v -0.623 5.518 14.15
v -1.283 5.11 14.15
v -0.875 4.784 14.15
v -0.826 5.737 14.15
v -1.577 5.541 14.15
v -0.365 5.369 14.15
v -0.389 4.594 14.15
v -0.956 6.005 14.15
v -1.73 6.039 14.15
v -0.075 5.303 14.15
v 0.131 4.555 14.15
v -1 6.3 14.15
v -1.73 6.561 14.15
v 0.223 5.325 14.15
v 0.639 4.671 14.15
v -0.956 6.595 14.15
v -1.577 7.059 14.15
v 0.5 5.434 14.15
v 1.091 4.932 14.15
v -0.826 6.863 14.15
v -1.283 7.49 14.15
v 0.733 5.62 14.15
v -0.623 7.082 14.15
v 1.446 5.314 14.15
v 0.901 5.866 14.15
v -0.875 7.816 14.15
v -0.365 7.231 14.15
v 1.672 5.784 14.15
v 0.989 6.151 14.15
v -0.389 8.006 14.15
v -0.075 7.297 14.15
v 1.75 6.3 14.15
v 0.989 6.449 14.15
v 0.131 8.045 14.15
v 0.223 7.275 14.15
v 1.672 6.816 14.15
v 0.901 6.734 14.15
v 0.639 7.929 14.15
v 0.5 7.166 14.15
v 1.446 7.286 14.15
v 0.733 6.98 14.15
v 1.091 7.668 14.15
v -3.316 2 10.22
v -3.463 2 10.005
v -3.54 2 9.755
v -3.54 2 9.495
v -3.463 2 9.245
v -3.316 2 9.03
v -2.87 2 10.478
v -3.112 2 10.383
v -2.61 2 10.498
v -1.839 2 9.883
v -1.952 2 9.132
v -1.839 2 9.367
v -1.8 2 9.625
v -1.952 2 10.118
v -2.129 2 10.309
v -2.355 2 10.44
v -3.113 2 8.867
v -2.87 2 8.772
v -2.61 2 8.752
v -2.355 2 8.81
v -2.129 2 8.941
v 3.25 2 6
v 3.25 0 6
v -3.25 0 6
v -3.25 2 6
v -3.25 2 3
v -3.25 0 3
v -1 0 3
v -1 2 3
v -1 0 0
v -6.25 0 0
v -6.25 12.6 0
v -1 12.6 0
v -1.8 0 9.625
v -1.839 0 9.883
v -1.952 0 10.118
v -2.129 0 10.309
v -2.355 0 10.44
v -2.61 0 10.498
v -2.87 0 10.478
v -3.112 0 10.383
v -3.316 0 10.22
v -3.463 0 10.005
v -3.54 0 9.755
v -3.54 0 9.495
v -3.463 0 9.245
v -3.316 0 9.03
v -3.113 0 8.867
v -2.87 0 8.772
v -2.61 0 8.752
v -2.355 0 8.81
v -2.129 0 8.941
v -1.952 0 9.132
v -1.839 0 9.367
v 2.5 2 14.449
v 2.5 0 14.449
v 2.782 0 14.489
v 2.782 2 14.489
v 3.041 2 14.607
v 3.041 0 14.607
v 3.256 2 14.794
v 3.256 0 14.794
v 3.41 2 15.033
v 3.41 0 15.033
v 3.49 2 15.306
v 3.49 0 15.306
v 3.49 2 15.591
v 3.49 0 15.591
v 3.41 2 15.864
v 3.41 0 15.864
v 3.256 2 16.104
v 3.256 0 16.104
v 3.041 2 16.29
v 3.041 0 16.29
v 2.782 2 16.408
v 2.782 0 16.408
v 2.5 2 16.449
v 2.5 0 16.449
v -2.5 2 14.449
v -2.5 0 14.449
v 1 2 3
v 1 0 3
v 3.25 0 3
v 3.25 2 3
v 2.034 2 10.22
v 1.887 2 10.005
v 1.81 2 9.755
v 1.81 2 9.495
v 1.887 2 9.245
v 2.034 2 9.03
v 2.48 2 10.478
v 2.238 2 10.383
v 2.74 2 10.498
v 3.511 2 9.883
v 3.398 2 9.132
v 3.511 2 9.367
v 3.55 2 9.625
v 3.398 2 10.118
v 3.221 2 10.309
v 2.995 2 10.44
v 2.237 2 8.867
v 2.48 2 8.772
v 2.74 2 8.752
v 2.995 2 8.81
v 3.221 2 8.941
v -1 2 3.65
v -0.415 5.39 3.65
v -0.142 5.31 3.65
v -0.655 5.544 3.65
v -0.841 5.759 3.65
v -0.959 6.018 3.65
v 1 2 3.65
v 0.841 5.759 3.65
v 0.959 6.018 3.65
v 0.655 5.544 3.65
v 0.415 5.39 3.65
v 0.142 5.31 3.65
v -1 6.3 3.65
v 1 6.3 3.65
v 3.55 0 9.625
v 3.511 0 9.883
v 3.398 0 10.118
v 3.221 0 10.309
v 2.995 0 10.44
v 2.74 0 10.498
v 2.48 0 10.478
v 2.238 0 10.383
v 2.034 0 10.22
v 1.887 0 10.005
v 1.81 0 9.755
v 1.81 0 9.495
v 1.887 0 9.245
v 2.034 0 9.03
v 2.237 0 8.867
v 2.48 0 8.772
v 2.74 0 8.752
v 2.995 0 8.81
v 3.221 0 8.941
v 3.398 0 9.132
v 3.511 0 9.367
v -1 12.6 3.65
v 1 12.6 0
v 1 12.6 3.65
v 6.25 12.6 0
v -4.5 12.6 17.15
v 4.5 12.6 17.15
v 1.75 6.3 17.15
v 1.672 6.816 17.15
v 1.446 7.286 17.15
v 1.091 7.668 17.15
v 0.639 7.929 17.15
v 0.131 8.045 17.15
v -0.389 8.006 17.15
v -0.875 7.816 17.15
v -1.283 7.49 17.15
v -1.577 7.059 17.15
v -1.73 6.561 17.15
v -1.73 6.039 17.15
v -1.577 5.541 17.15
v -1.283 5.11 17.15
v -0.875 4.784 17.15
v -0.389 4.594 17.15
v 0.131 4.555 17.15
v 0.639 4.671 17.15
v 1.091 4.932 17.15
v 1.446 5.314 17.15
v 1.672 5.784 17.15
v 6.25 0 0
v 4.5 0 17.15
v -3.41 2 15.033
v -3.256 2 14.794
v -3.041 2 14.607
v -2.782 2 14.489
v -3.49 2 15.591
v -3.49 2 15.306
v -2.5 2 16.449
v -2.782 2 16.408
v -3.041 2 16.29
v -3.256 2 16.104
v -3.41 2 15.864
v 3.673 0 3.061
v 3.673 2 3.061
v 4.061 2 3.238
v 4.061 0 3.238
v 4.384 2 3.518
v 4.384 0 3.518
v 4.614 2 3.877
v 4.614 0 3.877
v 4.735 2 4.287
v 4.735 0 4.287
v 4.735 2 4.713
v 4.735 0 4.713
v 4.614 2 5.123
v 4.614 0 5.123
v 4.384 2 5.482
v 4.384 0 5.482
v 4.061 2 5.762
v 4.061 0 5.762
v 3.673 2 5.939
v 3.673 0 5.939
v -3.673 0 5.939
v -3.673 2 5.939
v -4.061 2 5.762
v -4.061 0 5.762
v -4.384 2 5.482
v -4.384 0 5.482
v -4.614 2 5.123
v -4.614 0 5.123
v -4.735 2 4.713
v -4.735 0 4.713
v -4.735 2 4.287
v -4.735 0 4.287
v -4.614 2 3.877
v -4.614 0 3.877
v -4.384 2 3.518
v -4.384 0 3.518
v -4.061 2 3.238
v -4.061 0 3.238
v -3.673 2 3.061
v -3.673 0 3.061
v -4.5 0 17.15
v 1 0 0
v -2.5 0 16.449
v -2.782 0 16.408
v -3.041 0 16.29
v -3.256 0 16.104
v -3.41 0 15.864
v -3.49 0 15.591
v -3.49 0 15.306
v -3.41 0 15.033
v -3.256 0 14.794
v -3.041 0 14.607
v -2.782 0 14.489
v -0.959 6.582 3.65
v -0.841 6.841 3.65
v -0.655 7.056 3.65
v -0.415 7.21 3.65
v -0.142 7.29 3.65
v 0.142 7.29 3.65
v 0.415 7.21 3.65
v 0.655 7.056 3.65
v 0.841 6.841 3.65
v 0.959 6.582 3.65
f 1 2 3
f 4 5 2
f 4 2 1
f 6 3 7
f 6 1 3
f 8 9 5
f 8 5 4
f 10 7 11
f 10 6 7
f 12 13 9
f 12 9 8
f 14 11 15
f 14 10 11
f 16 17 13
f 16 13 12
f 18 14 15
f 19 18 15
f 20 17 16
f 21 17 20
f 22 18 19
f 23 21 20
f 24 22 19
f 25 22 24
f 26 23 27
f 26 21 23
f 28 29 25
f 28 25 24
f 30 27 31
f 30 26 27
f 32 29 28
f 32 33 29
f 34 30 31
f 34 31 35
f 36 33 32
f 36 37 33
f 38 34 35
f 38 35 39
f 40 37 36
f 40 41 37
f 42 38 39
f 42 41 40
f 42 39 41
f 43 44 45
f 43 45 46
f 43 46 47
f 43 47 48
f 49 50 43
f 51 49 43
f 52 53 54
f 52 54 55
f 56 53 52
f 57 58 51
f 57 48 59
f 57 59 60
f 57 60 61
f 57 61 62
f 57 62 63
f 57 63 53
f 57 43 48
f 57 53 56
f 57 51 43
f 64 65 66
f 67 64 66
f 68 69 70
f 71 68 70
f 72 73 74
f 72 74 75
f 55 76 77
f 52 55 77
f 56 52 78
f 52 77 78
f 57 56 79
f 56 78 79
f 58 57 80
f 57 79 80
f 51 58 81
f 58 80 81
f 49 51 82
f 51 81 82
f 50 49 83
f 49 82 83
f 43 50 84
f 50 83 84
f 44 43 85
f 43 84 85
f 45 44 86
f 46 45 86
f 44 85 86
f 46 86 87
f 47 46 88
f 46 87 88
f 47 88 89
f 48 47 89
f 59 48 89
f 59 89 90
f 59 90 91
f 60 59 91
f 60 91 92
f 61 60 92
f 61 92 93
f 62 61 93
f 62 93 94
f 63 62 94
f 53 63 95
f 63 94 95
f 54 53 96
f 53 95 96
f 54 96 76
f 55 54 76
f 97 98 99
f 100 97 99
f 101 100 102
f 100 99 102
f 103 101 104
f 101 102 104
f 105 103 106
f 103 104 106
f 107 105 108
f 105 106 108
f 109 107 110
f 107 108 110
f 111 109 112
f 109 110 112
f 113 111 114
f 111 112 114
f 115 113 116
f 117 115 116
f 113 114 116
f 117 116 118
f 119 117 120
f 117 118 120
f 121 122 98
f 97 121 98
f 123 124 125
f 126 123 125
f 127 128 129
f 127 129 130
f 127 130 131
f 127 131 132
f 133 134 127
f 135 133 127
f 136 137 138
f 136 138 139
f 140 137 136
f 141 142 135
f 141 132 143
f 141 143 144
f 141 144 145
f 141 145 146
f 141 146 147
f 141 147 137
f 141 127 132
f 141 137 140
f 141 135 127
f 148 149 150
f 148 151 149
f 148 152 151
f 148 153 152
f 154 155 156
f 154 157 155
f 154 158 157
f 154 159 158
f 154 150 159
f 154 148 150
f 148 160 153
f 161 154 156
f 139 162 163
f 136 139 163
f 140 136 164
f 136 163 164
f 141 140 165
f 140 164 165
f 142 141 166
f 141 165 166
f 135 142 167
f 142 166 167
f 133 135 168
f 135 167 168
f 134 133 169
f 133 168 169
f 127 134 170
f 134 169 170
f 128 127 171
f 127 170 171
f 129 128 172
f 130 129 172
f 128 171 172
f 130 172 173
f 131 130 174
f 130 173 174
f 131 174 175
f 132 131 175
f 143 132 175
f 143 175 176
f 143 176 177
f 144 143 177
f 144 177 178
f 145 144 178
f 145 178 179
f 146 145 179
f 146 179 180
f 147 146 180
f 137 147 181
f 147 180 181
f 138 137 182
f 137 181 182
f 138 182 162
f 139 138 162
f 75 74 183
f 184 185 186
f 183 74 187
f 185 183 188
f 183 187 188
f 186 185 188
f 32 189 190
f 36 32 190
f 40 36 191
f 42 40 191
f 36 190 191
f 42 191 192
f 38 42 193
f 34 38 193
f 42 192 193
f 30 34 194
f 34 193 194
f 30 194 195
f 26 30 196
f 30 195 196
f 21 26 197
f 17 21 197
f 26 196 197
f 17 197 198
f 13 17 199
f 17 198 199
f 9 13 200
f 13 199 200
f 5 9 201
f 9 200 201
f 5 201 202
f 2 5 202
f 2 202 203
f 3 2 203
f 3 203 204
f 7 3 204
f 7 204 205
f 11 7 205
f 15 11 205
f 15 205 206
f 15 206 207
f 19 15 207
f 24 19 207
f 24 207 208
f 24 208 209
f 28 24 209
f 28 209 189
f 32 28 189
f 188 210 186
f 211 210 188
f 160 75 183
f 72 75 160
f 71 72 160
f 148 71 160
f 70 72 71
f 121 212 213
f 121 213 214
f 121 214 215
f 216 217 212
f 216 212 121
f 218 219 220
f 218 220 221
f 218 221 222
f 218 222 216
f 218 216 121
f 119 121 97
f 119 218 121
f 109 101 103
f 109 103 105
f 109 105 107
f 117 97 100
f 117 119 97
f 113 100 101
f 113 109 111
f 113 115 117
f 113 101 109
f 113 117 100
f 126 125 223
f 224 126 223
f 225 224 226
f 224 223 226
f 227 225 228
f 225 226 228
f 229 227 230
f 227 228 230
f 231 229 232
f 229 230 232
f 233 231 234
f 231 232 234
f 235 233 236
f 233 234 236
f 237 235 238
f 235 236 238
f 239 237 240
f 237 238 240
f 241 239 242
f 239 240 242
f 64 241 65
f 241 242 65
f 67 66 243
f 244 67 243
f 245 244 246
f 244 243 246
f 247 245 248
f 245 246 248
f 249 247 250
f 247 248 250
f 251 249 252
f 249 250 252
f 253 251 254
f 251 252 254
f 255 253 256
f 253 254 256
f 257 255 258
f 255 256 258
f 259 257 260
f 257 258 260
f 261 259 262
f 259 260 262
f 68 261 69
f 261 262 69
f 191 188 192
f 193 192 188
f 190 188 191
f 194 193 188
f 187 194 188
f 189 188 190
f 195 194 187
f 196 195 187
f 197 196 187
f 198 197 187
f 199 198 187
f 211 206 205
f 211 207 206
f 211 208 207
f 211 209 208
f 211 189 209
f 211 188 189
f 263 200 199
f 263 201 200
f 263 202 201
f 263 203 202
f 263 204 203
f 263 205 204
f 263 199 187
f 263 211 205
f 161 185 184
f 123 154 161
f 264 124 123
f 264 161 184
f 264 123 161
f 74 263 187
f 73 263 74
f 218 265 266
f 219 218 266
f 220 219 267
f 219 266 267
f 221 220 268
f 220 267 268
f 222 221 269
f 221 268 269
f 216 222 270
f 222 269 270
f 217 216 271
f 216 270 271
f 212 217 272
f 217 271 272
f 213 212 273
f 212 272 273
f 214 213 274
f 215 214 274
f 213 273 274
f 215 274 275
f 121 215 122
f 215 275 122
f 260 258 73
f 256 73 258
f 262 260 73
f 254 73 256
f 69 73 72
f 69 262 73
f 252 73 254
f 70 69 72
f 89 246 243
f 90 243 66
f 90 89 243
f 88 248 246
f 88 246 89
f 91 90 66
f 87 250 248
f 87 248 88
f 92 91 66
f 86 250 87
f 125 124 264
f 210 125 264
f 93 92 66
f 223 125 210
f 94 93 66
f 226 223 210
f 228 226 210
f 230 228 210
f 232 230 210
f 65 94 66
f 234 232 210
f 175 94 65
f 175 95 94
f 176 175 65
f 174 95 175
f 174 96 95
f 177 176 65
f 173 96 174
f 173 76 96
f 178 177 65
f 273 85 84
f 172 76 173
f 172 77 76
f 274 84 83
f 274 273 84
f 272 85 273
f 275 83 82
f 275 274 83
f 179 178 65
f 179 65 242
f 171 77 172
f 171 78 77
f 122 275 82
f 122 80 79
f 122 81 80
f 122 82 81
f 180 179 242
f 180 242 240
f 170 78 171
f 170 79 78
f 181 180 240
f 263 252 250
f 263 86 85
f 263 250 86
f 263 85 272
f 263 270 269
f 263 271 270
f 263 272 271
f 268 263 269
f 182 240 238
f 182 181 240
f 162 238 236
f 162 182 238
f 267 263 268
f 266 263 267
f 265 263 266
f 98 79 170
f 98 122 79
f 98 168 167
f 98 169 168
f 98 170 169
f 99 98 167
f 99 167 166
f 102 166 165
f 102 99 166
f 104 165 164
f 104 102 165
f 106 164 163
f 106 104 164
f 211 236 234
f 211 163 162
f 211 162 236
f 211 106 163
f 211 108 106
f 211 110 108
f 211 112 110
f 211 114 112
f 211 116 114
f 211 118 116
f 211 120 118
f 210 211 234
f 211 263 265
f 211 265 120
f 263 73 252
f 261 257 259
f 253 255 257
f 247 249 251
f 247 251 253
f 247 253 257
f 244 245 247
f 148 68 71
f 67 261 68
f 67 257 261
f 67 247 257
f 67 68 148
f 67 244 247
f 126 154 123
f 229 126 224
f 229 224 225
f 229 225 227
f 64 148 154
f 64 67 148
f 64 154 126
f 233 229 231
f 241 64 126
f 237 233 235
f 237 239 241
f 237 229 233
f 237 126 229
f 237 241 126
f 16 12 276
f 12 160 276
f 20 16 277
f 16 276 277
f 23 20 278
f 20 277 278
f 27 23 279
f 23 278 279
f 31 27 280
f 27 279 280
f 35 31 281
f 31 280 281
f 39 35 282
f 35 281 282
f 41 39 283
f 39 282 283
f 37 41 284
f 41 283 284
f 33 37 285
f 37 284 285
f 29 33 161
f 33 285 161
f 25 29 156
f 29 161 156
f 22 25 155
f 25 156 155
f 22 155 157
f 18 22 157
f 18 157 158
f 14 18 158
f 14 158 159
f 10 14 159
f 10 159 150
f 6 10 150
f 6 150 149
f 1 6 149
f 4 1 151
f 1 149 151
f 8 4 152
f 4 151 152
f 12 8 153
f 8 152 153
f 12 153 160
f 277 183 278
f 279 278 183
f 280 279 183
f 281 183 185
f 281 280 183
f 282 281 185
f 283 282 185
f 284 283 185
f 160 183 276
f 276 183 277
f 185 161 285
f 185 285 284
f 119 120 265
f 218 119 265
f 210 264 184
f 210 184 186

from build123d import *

# Parameters (mm, degrees)
F0_R           = 0.875
F1_DEPTH       = 12.6
F2_DEPTH       = 2
F4_D           = 2
F4_DEPTH       = 38
F4_CBORE_D     = 3.5
F4_CBORE_DEPTH = 3
F4_TIP         = 0.600860619


# Not quite as in the source:
# - a feature names something its author has since deleted; it is built from what else it names


with BuildPart() as f1:
    # F0 (on Front) → F1 (new body)
    with BuildSketch(Plane.XZ):
        with BuildLine():
            Line((1, 0), (6.25, 0))
            Line((6.25, 0), (4.5, 17.15))
            Line((4.5, 17.15), (0, 17.15))
            Line((0, 17.15), (-4.5, 17.15))
            Line((-4.5, 17.15), (-6.25, 0))
            Line((-6.25, 0), (-1, 0))
            Line((-1, 0), (-1, 3))
            Line((-1, 3), (-3.25, 3))
            ThreePointArc((-3.25, 3), (-4.75, 4.5), (-3.25, 6))
            Line((-3.25, 6), (0, 6))
            Line((0, 6), (3.25, 6))
            ThreePointArc((3.25, 6), (4.75, 4.5), (3.25, 3))
            Line((3.25, 3), (1, 3))
            Line((1, 3), (1, 0))
        make_face()
        with Locations((-2.675, 9.625)):
            Circle(F0_R, mode=Mode.SUBTRACT)
        with Locations((2.675, 9.625)):
            Circle(F0_R, mode=Mode.SUBTRACT)
        with BuildLine():
            Line((-2.5, 16.4487531745), (0, 16.4487531745))
            Line((0, 16.4487531745), (2.5, 16.4487531745))
            ThreePointArc((2.5, 16.4487531745), (3.5, 15.4487531745), (2.5, 14.4487531745))
            Line((2.5, 14.4487531745), (0, 14.4487531745))
            Line((0, 14.4487531745), (-2.5, 14.4487531745))
            ThreePointArc((-2.5, 14.4487531745), (-3.5, 15.4487531745), (-2.5, 16.4487531745))
        make_face(mode=Mode.SUBTRACT)
        with BuildLine():
            Line((2.5, 16.4487531745), (0, 16.4487531745))
            Line((0, 16.4487531745), (-2.5, 16.4487531745))
            ThreePointArc((-2.5, 16.4487531745), (-3.5, 15.4487531745), (-2.5, 14.4487531745))
            Line((-2.5, 14.4487531745), (0, 14.4487531745))
            Line((0, 14.4487531745), (2.5, 14.4487531745))
            ThreePointArc((2.5, 14.4487531745), (3.5, 15.4487531745), (2.5, 16.4487531745))
        make_face()
        with Locations((-2.675, 9.625)):
            Circle(F0_R)
        with Locations((2.675, 9.625)):
            Circle(F0_R)
        with BuildLine():
            Line((1, 3.65), (1, 3))
            Line((1, 3), (3.25, 3))
            ThreePointArc((3.25, 3), (4.75, 4.5), (3.25, 6))
            Line((3.25, 6), (0, 6))
            Line((0, 6), (-3.25, 6))
            ThreePointArc((-3.25, 6), (-4.75, 4.5), (-3.25, 3))
            Line((-3.25, 3), (-1, 3))
            Line((-1, 3), (-1, 3.65))
            Line((-1, 3.65), (0, 3.65))
            Line((0, 3.65), (1, 3.65))
        make_face()
    extrude(amount=-F1_DEPTH)

    # F0 (on Front) → F2 (cut)
    with BuildSketch(Plane.XZ):
        with BuildLine():
            Line((1, 3.65), (1, 3))
            Line((1, 3), (3.25, 3))
            ThreePointArc((3.25, 3), (4.75, 4.5), (3.25, 6))
            Line((3.25, 6), (0, 6))
            Line((0, 6), (-3.25, 6))
            ThreePointArc((-3.25, 6), (-4.75, 4.5), (-3.25, 3))
            Line((-3.25, 3), (-1, 3))
            Line((-1, 3), (-1, 3.65))
            Line((-1, 3.65), (0, 3.65))
            Line((0, 3.65), (1, 3.65))
        make_face()
        with BuildLine():
            Line((2.5, 16.4487531745), (0, 16.4487531745))
            Line((0, 16.4487531745), (-2.5, 16.4487531745))
            ThreePointArc((-2.5, 16.4487531745), (-3.5, 15.4487531745), (-2.5, 14.4487531745))
            Line((-2.5, 14.4487531745), (0, 14.4487531745))
            Line((0, 14.4487531745), (2.5, 14.4487531745))
            ThreePointArc((2.5, 14.4487531745), (3.5, 15.4487531745), (2.5, 16.4487531745))
        make_face()
        with Locations((2.675, 9.625)):
            Circle(F0_R)
        with Locations((-2.675, 9.625)):
            Circle(F0_R)
    extrude(amount=-F2_DEPTH, mode=Mode.SUBTRACT)

    # F4
    with Locations(Plane.XY.offset(17.15)):
        with Locations((0, 6.3)):
            CounterBoreHole(F4_D / 2, F4_CBORE_D / 2, F4_CBORE_DEPTH, depth=F4_DEPTH)
            with Locations((0, 0, -(F4_DEPTH + F4_TIP / 2))):  # 118° drill point
                Cone(0, F4_D / 2, F4_TIP, mode=Mode.SUBTRACT)


solid = f1.part
